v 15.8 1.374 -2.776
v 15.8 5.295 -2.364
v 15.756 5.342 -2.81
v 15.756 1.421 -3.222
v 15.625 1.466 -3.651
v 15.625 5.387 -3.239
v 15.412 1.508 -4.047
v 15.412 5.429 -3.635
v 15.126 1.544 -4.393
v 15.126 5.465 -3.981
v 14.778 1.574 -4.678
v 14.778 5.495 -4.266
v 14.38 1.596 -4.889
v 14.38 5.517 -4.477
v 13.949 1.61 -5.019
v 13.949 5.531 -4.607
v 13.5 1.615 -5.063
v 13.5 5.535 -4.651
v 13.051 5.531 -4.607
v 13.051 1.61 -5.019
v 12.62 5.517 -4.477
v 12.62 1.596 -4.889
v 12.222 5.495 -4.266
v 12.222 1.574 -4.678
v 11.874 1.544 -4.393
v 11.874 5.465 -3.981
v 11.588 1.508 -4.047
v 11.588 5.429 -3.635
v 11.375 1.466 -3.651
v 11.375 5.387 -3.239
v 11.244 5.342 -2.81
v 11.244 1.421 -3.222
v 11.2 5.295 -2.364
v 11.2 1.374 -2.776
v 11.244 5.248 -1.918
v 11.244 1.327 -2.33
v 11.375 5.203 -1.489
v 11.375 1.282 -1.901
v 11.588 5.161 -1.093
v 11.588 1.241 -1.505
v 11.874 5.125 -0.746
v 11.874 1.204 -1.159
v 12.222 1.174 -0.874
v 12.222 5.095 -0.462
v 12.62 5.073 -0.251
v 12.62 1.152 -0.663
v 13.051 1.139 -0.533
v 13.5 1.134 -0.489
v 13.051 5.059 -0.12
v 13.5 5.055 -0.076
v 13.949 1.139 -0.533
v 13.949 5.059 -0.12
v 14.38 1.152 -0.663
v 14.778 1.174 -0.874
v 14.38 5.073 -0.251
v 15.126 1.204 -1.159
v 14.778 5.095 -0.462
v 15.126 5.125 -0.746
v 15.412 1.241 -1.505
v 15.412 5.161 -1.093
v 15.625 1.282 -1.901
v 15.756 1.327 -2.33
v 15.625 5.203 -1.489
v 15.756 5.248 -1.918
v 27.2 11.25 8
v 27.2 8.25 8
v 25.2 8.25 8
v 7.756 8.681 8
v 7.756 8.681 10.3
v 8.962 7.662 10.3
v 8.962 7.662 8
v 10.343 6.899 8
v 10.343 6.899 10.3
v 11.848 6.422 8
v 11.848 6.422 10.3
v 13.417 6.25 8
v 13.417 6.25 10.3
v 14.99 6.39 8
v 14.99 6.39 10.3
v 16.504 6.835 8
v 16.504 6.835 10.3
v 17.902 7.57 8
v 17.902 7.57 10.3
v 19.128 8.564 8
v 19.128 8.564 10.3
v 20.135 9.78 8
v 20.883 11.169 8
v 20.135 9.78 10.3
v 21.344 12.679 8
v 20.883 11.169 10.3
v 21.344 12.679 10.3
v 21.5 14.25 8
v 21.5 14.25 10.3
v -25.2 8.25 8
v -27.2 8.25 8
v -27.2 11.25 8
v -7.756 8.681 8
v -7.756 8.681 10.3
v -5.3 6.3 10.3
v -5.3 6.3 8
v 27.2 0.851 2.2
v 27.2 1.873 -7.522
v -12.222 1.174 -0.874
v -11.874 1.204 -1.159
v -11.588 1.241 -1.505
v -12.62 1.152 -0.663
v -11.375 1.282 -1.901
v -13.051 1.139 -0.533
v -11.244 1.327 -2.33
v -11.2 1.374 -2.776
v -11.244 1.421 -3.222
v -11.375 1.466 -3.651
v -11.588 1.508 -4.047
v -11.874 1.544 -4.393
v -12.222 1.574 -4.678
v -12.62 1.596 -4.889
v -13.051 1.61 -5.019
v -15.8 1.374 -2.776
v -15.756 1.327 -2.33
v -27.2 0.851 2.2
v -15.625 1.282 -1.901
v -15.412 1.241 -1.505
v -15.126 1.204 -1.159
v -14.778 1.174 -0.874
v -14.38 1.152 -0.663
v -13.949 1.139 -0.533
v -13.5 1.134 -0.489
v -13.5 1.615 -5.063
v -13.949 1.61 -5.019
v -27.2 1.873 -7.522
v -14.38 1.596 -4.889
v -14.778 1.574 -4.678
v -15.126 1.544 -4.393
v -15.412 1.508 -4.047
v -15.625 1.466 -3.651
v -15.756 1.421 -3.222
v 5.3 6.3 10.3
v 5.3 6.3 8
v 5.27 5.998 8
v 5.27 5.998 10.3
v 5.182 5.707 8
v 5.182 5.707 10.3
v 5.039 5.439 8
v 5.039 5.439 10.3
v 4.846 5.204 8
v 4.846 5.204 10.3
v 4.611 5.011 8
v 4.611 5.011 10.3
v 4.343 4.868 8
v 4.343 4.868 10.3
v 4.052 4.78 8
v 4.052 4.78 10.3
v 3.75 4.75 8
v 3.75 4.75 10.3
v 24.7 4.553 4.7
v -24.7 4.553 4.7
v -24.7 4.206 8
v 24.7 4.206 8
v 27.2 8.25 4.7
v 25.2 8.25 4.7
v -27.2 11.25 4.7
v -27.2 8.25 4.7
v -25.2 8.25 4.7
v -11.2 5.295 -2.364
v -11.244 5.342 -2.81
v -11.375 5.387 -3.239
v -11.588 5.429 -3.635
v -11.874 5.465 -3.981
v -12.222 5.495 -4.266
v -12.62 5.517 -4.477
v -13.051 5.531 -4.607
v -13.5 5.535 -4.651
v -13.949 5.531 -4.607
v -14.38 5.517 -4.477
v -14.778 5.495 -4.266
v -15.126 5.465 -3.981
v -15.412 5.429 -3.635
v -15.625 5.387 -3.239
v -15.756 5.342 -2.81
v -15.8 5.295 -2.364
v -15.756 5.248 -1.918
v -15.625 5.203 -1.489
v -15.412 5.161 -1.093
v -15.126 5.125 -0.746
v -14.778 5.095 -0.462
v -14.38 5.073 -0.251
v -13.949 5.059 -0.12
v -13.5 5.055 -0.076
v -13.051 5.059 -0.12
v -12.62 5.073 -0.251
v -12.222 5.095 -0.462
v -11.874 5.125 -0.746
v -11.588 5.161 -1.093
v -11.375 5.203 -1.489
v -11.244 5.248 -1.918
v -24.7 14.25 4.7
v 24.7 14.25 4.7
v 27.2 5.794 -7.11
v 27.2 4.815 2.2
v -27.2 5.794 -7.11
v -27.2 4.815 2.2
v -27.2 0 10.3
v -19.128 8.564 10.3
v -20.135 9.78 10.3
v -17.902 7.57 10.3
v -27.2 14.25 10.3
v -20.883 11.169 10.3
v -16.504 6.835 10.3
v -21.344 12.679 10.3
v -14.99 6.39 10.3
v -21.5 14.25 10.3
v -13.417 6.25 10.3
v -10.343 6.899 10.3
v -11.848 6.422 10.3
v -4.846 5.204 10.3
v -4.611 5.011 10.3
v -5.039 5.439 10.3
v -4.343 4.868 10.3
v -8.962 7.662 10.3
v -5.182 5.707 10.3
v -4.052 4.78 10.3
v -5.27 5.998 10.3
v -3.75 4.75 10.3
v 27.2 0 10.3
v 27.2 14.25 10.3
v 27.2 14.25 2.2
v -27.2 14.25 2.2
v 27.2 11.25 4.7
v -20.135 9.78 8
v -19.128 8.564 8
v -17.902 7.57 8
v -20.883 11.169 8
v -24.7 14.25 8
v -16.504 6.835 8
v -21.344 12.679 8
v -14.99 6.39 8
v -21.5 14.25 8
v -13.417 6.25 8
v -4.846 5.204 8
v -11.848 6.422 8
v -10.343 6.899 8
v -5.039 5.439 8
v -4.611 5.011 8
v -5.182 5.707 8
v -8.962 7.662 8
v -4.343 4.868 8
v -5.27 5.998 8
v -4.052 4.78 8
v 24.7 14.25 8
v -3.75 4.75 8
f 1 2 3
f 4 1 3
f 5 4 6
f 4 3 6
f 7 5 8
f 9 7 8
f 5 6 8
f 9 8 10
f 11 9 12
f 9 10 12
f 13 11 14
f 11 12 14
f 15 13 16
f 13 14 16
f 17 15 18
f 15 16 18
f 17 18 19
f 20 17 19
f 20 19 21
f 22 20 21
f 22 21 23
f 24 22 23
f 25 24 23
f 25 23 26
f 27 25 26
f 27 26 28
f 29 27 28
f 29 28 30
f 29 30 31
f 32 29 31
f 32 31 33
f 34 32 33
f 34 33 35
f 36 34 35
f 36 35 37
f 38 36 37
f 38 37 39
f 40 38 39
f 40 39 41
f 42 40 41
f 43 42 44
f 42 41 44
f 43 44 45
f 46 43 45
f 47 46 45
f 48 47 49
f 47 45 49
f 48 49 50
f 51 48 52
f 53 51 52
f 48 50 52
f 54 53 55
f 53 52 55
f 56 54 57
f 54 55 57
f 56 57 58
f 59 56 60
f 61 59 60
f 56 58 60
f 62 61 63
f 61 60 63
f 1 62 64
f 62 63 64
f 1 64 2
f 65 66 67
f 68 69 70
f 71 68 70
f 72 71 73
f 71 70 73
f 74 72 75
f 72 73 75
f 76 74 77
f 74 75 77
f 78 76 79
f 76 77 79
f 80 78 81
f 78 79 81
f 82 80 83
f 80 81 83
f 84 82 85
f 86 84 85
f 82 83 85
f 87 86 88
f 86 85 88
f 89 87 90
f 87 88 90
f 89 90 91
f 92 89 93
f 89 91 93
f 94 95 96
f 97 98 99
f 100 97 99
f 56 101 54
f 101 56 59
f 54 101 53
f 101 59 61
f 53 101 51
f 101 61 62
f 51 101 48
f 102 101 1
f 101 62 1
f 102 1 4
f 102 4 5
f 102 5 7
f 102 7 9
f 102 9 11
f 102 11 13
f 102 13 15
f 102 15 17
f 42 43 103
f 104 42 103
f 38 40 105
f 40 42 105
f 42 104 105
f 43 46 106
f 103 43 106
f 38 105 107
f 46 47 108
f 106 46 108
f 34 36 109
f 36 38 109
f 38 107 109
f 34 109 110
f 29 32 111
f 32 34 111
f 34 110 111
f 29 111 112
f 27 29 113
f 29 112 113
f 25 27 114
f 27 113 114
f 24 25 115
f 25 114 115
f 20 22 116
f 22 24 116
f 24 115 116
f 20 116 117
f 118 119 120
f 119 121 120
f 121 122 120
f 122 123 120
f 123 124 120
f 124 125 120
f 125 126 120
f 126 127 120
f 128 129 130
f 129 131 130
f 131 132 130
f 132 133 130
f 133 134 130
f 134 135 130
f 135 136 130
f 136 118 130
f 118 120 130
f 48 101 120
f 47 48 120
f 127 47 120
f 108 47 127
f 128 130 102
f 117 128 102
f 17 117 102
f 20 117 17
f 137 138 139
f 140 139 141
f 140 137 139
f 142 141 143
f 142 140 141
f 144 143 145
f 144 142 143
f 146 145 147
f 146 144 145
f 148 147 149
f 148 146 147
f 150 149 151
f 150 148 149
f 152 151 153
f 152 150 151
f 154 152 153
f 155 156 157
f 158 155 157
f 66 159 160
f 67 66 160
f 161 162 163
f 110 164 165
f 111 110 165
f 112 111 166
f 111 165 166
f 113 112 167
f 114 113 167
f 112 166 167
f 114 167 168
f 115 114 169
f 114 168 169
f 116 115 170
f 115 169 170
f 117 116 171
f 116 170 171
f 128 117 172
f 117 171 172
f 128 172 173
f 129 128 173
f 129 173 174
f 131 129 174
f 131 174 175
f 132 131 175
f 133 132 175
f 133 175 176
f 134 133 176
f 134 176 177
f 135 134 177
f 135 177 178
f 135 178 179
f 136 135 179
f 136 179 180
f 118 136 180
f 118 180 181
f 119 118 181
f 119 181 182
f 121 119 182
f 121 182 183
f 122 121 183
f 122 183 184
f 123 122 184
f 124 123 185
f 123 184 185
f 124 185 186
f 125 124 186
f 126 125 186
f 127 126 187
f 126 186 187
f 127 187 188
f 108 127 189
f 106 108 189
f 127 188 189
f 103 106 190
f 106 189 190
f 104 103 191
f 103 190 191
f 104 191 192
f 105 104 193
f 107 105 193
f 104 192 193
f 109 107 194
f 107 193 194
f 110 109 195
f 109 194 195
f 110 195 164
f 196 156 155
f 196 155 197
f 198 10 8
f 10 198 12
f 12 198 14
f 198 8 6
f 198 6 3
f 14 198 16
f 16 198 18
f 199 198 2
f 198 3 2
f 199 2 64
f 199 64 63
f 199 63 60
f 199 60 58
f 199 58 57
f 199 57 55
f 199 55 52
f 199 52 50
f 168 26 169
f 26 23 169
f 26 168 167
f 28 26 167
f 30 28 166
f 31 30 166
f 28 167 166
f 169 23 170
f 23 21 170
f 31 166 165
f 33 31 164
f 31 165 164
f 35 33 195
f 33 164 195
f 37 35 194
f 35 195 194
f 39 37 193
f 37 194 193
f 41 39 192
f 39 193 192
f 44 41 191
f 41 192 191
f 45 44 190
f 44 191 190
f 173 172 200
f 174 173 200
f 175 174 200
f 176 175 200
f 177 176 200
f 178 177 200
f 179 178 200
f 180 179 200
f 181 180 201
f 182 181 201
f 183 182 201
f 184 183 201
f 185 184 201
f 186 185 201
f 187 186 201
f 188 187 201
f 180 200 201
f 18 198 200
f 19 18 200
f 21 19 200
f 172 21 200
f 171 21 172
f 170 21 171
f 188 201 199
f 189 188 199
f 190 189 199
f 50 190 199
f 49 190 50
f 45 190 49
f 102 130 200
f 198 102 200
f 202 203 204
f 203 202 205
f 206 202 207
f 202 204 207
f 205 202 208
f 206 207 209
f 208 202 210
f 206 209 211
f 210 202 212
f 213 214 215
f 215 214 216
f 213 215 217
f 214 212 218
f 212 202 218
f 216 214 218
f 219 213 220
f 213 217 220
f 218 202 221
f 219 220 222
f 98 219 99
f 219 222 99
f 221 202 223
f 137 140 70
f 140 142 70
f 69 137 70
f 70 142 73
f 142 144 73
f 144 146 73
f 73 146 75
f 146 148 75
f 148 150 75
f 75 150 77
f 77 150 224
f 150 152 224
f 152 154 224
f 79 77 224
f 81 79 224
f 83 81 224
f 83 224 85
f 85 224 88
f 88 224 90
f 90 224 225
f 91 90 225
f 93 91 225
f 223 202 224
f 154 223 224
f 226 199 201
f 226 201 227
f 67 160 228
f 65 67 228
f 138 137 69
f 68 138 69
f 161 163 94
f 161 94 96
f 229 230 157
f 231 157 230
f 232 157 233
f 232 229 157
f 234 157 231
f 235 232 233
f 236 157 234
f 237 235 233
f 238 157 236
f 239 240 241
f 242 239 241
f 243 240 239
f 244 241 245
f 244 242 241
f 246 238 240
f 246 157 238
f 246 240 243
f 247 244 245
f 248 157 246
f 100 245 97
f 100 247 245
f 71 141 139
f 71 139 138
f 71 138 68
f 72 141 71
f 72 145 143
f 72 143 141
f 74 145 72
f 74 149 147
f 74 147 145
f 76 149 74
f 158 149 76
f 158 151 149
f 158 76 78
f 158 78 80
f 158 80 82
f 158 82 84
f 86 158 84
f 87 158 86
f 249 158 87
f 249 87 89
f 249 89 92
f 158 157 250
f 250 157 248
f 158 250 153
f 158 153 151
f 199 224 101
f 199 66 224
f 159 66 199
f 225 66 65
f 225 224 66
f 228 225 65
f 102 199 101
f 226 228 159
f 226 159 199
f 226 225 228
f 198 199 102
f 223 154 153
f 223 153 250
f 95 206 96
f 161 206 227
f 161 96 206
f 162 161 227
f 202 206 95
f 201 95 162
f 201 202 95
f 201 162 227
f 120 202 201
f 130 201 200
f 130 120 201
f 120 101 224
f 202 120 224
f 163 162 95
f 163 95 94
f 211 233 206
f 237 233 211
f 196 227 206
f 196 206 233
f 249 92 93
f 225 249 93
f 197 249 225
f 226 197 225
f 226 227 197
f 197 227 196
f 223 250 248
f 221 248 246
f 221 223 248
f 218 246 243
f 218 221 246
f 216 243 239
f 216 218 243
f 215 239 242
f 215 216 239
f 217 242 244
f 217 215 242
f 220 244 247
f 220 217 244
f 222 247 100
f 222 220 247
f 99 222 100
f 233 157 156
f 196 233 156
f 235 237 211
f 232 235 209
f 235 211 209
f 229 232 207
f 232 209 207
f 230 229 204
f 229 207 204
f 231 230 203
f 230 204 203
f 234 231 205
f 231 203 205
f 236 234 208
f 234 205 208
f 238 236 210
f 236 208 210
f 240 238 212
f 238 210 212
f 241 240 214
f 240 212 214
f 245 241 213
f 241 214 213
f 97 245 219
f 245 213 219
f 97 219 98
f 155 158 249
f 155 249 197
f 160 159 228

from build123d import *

# Parameters (mm, degrees)
SKETCH2_W           = 54.4
SKETCH2_H           = 16
BOSS_EXTRUDE1_DEPTH = 4
SKETCH3_W           = 2.3
SKETCH3_H           = 24
BOSS_EXTRUDE2_DEPTH = 54.4
SKETCH4_R           = 2.3
CUT_EXTRUDE1_DEPTH  = 45
CUT_EXTRUDE3_DEPTH  = 10
SKETCH5_R           = 8
CUT_EXTRUDE2_DEPTH  = 10
CUT_EXTRUDE4_DEPTH  = 10
SKETCH8_W           = 2.5
SKETCH8_H           = 10.25
BOSS_EXTRUDE3_DEPTH = 54.4
SKETCH9_W           = 2.5
SKETCH9_H           = 3.3
BOSS_EXTRUDE4_DEPTH = 10.25
CUT_EXTRUDE5_DEPTH  = 3.3
SKETCH11_W          = 54.4
SKETCH11_H          = 10.2
CUT_EXTRUDE6_DEPTH  = 10
BOSS_EXTRUDE5_DEPTH = 54.4
CUT_EXTRUDE7_DEPTH  = 54.4
SKETCH14_R          = 2.3
CUT_EXTRUDE8_DEPTH  = 54.4


with BuildPart() as part:
    # Sketch2 → Boss-Extrude1 (new body)
    with BuildSketch(Plane(origin=(0, 0, 0), x_dir=(1, 0, 0), z_dir=(0, 1, 0))):
        Rectangle(SKETCH2_W, SKETCH2_H)
    extrude(amount=BOSS_EXTRUDE1_DEPTH)

    # Sketch3 → Boss-Extrude2 (add)
    with BuildSketch(Plane(origin=(27.2, 0, 0), x_dir=(0, 0, -1), z_dir=(1, 0, 0))):
        with Locations((-9.15, 12)):
            Rectangle(SKETCH3_W, SKETCH3_H)
    extrude(amount=-BOSS_EXTRUDE2_DEPTH)

    # Sketch4 → Cut-Extrude1 (cut)
    with BuildSketch(Plane(origin=(0, 4, 0), x_dir=(1, 0, 0), z_dir=(0, 1, 0))):
        with Locations((-13.5, 2.5)):
            Circle(SKETCH4_R)
        with Locations((13.5, 2.5)):
            Circle(SKETCH4_R)
    extrude(amount=-CUT_EXTRUDE1_DEPTH, mode=Mode.SUBTRACT)

    # Sketch6 → Cut-Extrude3 (cut)
    with BuildSketch(Plane.XY.offset(10.3)):
        with BuildLine():
            Line((-3.75, 7.85), (3.75, 7.85))
            ThreePointArc((3.75, 7.85), (5.3, 6.3), (3.75, 4.75))
            Line((3.75, 4.75), (-3.75, 4.75))
            ThreePointArc((-3.75, 4.75), (-5.3, 6.3), (-3.75, 7.85))
        make_face()
    extrude(amount=-CUT_EXTRUDE3_DEPTH, mode=Mode.SUBTRACT)

    # Sketch5 → Cut-Extrude2 (cut)
    with BuildSketch(Plane.XY.offset(10.3)):
        with Locations((-13.5, 14.25)):
            Circle(SKETCH5_R)
        with Locations((13.5, 14.25)):
            Circle(SKETCH5_R)
    extrude(amount=-CUT_EXTRUDE2_DEPTH, mode=Mode.SUBTRACT)

    # Sketch7 → Cut-Extrude4 (cut)
    with BuildSketch(Plane.XY.offset(10.3)):
        Polygon((-35.24269893, 14.25), (-13.5, 14.25), (-5.3, 6.3), (0, 6.5), (5.3, 6.3), (13.5, 14.25), (21.5, 14.25), (36.006358293, 14.25), (36.006358293, 27.887641337), (-35.24269893, 27.887641337), align=None)
    extrude(amount=-CUT_EXTRUDE4_DEPTH, mode=Mode.SUBTRACT)

    # Sketch8 → Boss-Extrude3 (add)
    with BuildSketch(Plane(origin=(27.2, 0, 0), x_dir=(0, 0, -1), z_dir=(1, 0, 0))):
        with Locations((-3.45, 9.125)):
            Rectangle(SKETCH8_W, SKETCH8_H)
    extrude(amount=-BOSS_EXTRUDE3_DEPTH)

    # Sketch9 → Boss-Extrude4 (add)
    with BuildSketch(Plane(origin=(0, 4, 0), x_dir=(1, 0, 0), z_dir=(0, 1, 0))):
        with Locations((-25.95, -6.35)):
            Rectangle(SKETCH9_W, SKETCH9_H)
        with Locations((25.95, -6.35)):
            Rectangle(SKETCH9_W, SKETCH9_H)
    extrude(amount=BOSS_EXTRUDE4_DEPTH)

    # Sketch10 → Cut-Extrude5 (cut)
    with BuildSketch(Plane.XY.offset(4.7)):
        Polygon((-27.2, 8.25), (-25.2, 8.25), (-27.2, 11.25), align=None)
        Polygon((27.2, 11.25), (27.2, 8.25), (25.2, 8.25), align=None)
    extrude(amount=CUT_EXTRUDE5_DEPTH, mode=Mode.SUBTRACT)

    # Sketch11 → Cut-Extrude6 (cut)
    with BuildSketch(Plane(origin=(0, 4, 0), x_dir=(1, 0, 0), z_dir=(0, 1, 0))):
        with Locations((0, 2.9)):
            Rectangle(SKETCH11_W, SKETCH11_H)
    extrude(amount=-CUT_EXTRUDE6_DEPTH, mode=Mode.SUBTRACT)

    # Sketch12 → Boss-Extrude5 (add)
    with BuildSketch(Plane.ZY.offset(27.2)):
        Polygon((10.3, 0), (-7.522416627, 1.87321147), (-7.110333074, 5.793924586), (10.3, 3.964024842), align=None)
    extrude(amount=-BOSS_EXTRUDE5_DEPTH)

    # Sketch13 → Cut-Extrude7 (cut)
    with BuildSketch(Plane(origin=(27.2, 0, 0), x_dir=(0, 0, -1), z_dir=(1, 0, 0))):
        Polygon((-2.2, 0.851344306), (-10.3, 0), (-2.2, 0), align=None)
    extrude(amount=-CUT_EXTRUDE7_DEPTH, mode=Mode.SUBTRACT)

    # Sketch14 → Cut-Extrude8 (cut)
    with BuildSketch(Plane(origin=(0, 4.991458323, 0.52462341), x_dir=(1, 0, 0), z_dir=(0, 0.994521895, 0.104528463))):
        with Locations((-13.5, 2.904418591)):
            Circle(SKETCH14_R)
        with Locations((13.5, 2.904418591)):
            Circle(SKETCH14_R)
    extrude(amount=-CUT_EXTRUDE8_DEPTH, mode=Mode.SUBTRACT)


solid = part.part
